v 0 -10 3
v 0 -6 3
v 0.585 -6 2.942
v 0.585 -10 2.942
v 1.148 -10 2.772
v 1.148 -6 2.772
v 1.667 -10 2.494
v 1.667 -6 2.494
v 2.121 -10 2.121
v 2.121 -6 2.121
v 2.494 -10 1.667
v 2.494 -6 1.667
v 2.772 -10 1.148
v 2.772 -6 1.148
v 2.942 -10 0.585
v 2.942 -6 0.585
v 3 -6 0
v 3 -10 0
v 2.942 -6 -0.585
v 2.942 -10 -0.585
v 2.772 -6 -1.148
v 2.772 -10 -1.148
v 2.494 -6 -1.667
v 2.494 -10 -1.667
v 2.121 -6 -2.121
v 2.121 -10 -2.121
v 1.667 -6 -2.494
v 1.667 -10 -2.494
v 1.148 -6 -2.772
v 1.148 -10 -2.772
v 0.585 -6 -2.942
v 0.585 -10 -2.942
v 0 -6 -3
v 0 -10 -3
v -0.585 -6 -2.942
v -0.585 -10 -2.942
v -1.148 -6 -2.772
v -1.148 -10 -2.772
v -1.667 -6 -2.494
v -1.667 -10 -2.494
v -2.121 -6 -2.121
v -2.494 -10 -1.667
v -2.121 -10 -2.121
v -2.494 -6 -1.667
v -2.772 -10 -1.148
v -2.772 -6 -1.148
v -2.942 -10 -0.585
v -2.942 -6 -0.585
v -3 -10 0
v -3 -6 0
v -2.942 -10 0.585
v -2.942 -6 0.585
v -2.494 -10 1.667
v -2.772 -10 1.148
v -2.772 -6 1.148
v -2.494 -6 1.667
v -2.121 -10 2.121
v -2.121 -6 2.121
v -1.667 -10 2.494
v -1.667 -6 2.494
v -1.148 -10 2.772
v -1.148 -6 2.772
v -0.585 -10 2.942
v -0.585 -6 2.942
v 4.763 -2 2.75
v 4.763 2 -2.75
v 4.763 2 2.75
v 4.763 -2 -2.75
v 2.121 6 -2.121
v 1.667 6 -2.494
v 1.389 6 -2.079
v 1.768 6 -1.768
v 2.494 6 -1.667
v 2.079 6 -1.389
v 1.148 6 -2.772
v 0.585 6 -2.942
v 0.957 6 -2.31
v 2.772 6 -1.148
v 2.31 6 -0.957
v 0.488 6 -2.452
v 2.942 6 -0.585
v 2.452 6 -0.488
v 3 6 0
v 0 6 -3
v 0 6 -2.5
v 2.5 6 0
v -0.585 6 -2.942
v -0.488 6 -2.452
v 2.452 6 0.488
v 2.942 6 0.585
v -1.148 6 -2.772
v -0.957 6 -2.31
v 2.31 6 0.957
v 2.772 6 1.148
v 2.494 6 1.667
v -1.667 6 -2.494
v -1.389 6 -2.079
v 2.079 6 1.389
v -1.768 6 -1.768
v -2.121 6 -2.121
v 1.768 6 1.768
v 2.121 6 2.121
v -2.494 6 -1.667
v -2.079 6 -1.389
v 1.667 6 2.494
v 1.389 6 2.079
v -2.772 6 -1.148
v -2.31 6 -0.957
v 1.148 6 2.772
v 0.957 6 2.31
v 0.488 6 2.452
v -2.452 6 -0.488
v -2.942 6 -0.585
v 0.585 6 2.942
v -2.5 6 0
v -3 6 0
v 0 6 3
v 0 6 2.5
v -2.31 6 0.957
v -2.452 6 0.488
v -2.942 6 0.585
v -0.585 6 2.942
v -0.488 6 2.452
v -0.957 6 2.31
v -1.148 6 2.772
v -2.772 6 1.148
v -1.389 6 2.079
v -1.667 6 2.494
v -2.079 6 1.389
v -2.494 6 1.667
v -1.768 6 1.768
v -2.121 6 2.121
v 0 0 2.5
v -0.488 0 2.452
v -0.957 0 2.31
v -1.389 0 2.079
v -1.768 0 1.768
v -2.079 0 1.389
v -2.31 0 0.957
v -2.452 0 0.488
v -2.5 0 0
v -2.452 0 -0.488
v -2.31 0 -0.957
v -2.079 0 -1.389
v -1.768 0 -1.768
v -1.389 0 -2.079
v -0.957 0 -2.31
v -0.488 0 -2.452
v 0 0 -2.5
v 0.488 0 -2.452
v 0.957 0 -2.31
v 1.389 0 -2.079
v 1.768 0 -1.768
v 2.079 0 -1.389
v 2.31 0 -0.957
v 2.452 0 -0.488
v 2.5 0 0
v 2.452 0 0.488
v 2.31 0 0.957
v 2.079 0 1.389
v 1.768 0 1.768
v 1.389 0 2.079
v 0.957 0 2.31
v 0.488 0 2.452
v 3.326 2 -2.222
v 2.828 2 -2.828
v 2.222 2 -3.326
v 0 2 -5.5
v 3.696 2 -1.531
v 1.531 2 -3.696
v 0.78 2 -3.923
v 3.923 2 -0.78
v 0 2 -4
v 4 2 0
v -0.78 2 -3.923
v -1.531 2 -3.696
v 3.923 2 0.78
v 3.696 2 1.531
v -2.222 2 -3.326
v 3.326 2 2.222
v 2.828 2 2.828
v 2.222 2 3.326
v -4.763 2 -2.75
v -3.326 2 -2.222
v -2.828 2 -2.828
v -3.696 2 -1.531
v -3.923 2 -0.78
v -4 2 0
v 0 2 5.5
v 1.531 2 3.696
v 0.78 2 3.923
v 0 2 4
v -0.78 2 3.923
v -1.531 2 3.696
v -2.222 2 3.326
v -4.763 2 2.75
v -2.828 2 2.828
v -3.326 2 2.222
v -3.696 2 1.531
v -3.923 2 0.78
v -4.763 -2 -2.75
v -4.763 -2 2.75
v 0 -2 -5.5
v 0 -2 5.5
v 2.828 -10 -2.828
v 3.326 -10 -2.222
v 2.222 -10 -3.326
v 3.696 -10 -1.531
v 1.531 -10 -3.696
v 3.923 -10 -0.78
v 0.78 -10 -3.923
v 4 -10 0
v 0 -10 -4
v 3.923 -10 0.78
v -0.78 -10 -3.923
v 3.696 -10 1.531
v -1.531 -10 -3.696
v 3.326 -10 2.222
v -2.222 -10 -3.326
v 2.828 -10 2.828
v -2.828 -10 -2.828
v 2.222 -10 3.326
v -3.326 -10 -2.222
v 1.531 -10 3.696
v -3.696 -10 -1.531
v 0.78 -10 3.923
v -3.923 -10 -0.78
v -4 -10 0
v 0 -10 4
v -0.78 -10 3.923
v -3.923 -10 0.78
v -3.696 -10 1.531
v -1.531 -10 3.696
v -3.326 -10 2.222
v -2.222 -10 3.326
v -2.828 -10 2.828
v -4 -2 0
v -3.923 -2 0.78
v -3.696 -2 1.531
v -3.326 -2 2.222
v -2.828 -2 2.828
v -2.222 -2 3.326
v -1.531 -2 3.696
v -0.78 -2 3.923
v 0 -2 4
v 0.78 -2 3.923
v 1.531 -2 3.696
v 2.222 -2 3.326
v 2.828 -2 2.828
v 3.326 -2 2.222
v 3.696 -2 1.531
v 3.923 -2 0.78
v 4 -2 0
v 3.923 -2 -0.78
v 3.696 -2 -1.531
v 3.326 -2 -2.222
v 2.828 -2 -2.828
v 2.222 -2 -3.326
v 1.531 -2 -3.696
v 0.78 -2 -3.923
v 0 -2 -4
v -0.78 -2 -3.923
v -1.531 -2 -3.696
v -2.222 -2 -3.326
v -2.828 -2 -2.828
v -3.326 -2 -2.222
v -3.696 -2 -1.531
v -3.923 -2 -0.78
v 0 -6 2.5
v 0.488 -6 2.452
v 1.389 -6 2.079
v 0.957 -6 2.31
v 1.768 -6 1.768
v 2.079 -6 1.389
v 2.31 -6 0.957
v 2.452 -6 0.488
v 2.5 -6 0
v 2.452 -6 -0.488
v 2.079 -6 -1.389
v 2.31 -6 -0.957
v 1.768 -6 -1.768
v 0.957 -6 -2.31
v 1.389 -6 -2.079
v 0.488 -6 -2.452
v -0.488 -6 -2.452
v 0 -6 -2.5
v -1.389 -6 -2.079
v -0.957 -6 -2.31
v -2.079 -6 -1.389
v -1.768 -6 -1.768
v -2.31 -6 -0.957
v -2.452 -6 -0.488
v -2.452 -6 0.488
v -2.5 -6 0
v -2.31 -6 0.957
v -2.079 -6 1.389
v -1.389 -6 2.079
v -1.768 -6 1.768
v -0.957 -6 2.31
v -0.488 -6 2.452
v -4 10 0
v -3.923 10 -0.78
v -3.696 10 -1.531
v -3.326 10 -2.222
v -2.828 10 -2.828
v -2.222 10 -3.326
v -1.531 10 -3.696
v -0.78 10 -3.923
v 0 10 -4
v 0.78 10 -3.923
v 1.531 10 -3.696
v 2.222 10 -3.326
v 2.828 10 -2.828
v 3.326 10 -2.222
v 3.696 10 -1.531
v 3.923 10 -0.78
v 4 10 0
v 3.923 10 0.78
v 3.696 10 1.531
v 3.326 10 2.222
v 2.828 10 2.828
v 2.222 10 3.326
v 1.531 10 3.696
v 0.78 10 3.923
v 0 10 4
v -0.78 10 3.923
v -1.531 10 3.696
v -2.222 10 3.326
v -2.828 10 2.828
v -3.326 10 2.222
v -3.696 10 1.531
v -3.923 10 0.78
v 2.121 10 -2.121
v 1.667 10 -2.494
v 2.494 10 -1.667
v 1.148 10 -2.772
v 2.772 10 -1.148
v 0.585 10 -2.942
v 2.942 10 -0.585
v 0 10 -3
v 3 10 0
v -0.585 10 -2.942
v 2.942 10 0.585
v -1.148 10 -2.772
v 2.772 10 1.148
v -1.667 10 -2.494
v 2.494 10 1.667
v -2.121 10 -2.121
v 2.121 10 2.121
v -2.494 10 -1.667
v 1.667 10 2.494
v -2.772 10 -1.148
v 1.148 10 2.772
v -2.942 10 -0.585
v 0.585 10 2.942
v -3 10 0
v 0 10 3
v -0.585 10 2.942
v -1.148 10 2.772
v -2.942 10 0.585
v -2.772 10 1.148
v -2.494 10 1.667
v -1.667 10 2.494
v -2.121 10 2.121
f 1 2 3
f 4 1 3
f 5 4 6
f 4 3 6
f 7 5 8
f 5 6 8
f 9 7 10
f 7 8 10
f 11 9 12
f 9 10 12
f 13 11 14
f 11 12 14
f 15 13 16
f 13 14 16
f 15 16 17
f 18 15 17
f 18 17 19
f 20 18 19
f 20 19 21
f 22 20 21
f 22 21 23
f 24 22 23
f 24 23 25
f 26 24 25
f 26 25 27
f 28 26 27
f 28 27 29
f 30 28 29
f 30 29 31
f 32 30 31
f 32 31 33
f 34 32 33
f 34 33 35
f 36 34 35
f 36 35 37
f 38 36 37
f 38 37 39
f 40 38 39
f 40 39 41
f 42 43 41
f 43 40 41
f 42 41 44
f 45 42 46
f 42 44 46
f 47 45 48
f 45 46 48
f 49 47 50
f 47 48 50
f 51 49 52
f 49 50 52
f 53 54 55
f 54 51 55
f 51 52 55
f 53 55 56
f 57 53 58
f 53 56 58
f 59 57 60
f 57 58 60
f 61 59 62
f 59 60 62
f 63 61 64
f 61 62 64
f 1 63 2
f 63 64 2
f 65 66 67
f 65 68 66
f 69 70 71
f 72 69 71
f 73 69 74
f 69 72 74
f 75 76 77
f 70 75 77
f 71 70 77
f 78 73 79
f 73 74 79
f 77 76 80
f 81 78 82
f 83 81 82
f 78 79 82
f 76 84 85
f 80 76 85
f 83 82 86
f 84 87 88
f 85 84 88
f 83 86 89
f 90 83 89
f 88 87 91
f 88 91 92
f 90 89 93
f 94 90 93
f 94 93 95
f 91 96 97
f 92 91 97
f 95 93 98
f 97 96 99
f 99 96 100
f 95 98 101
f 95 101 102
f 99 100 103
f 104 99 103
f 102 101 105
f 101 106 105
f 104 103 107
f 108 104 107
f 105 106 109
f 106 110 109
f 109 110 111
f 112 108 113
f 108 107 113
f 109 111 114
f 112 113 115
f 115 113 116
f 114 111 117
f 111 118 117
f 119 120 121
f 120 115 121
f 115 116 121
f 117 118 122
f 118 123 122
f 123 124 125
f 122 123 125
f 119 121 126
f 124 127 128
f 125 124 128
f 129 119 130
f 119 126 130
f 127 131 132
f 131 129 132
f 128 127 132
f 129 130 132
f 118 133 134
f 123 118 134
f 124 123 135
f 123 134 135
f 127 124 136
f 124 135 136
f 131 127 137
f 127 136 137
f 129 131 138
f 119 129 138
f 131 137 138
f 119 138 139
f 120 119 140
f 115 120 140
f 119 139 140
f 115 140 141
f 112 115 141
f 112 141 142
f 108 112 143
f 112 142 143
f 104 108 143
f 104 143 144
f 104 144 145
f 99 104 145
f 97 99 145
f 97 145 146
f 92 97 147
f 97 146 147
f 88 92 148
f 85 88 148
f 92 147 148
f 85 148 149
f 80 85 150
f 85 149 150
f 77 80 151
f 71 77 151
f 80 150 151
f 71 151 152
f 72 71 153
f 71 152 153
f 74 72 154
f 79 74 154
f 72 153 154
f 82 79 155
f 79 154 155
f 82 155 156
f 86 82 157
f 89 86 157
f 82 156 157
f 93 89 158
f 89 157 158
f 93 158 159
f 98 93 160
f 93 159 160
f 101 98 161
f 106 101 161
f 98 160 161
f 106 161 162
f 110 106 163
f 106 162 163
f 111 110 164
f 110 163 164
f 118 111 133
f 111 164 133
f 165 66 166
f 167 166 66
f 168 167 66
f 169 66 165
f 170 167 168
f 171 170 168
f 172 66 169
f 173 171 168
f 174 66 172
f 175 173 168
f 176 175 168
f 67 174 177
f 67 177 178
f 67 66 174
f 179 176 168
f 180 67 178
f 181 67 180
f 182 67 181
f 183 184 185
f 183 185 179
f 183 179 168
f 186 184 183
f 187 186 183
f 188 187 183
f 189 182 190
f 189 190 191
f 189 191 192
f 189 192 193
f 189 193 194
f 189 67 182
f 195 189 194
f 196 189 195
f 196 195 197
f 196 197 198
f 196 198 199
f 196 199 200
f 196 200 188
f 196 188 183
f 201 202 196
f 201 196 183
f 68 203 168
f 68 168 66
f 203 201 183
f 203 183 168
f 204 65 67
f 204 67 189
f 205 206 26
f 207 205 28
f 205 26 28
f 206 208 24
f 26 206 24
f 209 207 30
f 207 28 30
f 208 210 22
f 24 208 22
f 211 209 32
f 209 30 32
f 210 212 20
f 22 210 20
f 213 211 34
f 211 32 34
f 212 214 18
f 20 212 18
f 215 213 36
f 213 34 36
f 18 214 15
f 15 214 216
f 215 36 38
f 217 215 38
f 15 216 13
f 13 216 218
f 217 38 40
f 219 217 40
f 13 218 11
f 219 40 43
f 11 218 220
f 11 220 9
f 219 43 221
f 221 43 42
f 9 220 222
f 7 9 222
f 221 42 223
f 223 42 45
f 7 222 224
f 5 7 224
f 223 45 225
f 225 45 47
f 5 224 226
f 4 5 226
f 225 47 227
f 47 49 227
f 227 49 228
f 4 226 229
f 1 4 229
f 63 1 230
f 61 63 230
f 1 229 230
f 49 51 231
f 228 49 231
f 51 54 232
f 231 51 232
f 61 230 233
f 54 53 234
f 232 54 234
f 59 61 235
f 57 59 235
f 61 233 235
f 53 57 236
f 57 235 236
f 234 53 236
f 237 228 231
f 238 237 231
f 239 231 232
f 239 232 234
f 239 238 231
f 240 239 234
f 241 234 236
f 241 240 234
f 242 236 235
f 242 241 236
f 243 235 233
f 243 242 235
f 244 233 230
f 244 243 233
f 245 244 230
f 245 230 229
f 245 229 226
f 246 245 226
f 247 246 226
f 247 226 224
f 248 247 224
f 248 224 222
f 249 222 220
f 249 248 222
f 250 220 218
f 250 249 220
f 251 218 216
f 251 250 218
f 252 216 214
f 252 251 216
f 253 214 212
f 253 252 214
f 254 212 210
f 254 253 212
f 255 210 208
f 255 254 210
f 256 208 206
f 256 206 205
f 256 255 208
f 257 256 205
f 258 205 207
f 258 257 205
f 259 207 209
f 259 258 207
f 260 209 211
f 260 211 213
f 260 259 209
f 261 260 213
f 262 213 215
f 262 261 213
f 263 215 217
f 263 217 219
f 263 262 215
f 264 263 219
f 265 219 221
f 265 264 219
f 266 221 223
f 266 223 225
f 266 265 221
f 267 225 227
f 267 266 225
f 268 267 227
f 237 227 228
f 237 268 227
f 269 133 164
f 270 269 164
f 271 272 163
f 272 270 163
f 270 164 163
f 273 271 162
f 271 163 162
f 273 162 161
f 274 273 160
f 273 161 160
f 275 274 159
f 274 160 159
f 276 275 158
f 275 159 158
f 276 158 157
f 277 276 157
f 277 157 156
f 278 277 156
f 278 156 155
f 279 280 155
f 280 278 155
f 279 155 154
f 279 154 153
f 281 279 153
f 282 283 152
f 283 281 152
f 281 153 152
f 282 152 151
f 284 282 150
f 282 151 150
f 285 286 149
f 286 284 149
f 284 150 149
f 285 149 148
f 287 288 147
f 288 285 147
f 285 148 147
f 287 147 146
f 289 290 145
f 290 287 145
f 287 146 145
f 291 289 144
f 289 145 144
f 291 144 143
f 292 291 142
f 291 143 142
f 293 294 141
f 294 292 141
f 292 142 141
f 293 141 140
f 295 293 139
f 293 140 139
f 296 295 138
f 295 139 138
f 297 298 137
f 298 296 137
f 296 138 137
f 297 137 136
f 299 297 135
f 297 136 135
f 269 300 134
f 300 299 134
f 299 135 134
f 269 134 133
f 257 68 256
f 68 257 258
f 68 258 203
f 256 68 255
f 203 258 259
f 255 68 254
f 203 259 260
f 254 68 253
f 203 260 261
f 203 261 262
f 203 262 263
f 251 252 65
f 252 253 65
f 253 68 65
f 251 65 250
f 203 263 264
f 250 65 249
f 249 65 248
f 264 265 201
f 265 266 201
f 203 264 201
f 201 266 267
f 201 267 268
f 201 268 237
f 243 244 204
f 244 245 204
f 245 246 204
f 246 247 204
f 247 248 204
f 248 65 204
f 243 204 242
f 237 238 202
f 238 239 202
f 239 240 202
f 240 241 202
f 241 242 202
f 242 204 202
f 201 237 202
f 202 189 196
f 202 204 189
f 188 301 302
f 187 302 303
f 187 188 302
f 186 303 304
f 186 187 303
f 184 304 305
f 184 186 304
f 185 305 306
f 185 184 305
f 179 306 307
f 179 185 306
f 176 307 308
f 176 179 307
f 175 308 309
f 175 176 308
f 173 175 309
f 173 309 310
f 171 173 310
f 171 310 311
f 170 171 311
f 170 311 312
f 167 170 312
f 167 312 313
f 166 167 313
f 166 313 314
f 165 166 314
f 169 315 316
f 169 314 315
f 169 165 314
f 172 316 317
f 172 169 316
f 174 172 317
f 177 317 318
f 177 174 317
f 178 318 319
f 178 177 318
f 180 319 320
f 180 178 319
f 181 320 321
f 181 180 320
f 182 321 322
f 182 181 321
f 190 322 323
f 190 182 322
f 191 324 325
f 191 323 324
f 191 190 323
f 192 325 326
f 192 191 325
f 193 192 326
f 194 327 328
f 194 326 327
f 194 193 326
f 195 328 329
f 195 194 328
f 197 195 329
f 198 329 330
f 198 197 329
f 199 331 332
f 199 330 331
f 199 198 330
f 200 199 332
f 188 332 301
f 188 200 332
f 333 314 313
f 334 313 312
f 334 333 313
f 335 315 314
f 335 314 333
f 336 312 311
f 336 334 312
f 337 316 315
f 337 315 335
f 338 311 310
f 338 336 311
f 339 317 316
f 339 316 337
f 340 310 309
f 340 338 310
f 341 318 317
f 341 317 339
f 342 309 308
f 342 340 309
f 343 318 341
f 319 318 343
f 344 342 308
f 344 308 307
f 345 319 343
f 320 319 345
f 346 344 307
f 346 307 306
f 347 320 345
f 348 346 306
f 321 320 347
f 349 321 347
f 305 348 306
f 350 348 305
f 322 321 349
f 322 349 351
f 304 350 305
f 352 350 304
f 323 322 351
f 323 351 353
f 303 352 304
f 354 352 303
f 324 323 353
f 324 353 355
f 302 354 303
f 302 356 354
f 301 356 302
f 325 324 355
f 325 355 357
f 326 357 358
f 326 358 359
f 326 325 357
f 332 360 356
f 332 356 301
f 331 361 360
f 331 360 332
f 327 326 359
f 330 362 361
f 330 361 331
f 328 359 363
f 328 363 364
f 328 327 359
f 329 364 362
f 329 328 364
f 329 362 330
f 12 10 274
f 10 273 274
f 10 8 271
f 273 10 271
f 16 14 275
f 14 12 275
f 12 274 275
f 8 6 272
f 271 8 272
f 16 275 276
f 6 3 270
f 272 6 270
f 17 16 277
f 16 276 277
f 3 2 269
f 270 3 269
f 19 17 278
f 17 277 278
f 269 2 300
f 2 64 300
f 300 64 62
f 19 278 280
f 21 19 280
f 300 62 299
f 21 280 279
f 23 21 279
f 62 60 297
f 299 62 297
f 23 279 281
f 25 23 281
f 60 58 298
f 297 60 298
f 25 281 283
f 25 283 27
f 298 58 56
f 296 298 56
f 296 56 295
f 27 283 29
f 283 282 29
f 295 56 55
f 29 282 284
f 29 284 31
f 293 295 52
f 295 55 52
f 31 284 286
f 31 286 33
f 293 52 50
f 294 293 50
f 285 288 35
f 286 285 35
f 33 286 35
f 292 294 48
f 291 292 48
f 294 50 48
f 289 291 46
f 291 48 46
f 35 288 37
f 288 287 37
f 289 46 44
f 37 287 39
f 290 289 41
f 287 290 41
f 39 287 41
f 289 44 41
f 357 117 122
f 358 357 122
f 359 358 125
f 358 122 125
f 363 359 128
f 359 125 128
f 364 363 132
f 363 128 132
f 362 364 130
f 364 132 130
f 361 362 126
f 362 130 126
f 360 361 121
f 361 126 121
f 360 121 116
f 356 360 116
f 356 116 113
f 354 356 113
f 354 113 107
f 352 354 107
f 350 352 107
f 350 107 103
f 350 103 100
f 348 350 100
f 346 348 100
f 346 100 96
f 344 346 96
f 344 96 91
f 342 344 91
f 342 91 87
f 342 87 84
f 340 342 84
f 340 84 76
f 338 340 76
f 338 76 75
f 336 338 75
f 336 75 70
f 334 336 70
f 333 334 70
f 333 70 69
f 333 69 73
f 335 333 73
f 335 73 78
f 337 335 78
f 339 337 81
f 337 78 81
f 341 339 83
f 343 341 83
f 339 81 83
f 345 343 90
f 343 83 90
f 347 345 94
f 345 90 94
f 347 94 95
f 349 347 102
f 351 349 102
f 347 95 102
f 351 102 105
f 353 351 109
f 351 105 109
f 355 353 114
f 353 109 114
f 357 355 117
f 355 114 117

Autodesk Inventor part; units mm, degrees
ref_plane "YZ Plane" through (0, 0, 0) normal (1, 0, 0) x (0, 1, 0)
ref_plane "XY Plane" through (0, 0, 0) normal (0, 0, 1) x (1, 0, 0)
sketch "Sketch1" plane through (0, 0, 0) normal (0, 1, 0) x (-1, 0, 0)
  line L0 (0, 0) -> (5.5, 0)
  line L1 (0, 0) -> (0, -5.5)
  line L2 (0, -5.5) -> (-4.7631, -2.75)
  line L3 (-4.7631, -2.75) -> (-4.7631, 2.75)
  line L4 (-4.7631, 2.75) -> (0, 5.5)
  line L5 (0, 5.5) -> (4.7631, 2.75)
  line L6 (4.7631, 2.75) -> (4.7631, -2.75)
  line L7 (4.7631, -2.75) -> (0, -5.5)
  dimension "d0" = 5.5
  dimension "d1" = 5.5
extrude "Extrusion1" add sketch "Sketch1" along normal mid plane 4
sketch "Sketch2" plane through (0, 0, 0) normal (0, 1, 0) x (-1, 0, 0)
  circle A0 centre (0, 0) radius 4
  dimension "d4" = 8
extrude "Extrusion2" add sketch "Sketch2" along normal mid plane 20
sketch "Sketch3" plane through (0, 10, 0) normal (0, 1, 0) x (1, 0, 0)
  circle A0 centre (0, 0) radius 3
  dimension "d7" = 6
hole "Hole1" at (0, 10, 0) direction (0, -1, 0) diameter 5 depth 10 tip angle 118 counterbore diameter 6 counterbore depth 4
ref_plane "Work Plane1" through (0, 0, 0) normal (0, 1, 0) x (-1, 0, 0)
mirror "Mirror1" about plane through (0, 0, 0) normal (0, 1, 0) of "Hole1"
properties part number "Inlet Pipe Nipple"
